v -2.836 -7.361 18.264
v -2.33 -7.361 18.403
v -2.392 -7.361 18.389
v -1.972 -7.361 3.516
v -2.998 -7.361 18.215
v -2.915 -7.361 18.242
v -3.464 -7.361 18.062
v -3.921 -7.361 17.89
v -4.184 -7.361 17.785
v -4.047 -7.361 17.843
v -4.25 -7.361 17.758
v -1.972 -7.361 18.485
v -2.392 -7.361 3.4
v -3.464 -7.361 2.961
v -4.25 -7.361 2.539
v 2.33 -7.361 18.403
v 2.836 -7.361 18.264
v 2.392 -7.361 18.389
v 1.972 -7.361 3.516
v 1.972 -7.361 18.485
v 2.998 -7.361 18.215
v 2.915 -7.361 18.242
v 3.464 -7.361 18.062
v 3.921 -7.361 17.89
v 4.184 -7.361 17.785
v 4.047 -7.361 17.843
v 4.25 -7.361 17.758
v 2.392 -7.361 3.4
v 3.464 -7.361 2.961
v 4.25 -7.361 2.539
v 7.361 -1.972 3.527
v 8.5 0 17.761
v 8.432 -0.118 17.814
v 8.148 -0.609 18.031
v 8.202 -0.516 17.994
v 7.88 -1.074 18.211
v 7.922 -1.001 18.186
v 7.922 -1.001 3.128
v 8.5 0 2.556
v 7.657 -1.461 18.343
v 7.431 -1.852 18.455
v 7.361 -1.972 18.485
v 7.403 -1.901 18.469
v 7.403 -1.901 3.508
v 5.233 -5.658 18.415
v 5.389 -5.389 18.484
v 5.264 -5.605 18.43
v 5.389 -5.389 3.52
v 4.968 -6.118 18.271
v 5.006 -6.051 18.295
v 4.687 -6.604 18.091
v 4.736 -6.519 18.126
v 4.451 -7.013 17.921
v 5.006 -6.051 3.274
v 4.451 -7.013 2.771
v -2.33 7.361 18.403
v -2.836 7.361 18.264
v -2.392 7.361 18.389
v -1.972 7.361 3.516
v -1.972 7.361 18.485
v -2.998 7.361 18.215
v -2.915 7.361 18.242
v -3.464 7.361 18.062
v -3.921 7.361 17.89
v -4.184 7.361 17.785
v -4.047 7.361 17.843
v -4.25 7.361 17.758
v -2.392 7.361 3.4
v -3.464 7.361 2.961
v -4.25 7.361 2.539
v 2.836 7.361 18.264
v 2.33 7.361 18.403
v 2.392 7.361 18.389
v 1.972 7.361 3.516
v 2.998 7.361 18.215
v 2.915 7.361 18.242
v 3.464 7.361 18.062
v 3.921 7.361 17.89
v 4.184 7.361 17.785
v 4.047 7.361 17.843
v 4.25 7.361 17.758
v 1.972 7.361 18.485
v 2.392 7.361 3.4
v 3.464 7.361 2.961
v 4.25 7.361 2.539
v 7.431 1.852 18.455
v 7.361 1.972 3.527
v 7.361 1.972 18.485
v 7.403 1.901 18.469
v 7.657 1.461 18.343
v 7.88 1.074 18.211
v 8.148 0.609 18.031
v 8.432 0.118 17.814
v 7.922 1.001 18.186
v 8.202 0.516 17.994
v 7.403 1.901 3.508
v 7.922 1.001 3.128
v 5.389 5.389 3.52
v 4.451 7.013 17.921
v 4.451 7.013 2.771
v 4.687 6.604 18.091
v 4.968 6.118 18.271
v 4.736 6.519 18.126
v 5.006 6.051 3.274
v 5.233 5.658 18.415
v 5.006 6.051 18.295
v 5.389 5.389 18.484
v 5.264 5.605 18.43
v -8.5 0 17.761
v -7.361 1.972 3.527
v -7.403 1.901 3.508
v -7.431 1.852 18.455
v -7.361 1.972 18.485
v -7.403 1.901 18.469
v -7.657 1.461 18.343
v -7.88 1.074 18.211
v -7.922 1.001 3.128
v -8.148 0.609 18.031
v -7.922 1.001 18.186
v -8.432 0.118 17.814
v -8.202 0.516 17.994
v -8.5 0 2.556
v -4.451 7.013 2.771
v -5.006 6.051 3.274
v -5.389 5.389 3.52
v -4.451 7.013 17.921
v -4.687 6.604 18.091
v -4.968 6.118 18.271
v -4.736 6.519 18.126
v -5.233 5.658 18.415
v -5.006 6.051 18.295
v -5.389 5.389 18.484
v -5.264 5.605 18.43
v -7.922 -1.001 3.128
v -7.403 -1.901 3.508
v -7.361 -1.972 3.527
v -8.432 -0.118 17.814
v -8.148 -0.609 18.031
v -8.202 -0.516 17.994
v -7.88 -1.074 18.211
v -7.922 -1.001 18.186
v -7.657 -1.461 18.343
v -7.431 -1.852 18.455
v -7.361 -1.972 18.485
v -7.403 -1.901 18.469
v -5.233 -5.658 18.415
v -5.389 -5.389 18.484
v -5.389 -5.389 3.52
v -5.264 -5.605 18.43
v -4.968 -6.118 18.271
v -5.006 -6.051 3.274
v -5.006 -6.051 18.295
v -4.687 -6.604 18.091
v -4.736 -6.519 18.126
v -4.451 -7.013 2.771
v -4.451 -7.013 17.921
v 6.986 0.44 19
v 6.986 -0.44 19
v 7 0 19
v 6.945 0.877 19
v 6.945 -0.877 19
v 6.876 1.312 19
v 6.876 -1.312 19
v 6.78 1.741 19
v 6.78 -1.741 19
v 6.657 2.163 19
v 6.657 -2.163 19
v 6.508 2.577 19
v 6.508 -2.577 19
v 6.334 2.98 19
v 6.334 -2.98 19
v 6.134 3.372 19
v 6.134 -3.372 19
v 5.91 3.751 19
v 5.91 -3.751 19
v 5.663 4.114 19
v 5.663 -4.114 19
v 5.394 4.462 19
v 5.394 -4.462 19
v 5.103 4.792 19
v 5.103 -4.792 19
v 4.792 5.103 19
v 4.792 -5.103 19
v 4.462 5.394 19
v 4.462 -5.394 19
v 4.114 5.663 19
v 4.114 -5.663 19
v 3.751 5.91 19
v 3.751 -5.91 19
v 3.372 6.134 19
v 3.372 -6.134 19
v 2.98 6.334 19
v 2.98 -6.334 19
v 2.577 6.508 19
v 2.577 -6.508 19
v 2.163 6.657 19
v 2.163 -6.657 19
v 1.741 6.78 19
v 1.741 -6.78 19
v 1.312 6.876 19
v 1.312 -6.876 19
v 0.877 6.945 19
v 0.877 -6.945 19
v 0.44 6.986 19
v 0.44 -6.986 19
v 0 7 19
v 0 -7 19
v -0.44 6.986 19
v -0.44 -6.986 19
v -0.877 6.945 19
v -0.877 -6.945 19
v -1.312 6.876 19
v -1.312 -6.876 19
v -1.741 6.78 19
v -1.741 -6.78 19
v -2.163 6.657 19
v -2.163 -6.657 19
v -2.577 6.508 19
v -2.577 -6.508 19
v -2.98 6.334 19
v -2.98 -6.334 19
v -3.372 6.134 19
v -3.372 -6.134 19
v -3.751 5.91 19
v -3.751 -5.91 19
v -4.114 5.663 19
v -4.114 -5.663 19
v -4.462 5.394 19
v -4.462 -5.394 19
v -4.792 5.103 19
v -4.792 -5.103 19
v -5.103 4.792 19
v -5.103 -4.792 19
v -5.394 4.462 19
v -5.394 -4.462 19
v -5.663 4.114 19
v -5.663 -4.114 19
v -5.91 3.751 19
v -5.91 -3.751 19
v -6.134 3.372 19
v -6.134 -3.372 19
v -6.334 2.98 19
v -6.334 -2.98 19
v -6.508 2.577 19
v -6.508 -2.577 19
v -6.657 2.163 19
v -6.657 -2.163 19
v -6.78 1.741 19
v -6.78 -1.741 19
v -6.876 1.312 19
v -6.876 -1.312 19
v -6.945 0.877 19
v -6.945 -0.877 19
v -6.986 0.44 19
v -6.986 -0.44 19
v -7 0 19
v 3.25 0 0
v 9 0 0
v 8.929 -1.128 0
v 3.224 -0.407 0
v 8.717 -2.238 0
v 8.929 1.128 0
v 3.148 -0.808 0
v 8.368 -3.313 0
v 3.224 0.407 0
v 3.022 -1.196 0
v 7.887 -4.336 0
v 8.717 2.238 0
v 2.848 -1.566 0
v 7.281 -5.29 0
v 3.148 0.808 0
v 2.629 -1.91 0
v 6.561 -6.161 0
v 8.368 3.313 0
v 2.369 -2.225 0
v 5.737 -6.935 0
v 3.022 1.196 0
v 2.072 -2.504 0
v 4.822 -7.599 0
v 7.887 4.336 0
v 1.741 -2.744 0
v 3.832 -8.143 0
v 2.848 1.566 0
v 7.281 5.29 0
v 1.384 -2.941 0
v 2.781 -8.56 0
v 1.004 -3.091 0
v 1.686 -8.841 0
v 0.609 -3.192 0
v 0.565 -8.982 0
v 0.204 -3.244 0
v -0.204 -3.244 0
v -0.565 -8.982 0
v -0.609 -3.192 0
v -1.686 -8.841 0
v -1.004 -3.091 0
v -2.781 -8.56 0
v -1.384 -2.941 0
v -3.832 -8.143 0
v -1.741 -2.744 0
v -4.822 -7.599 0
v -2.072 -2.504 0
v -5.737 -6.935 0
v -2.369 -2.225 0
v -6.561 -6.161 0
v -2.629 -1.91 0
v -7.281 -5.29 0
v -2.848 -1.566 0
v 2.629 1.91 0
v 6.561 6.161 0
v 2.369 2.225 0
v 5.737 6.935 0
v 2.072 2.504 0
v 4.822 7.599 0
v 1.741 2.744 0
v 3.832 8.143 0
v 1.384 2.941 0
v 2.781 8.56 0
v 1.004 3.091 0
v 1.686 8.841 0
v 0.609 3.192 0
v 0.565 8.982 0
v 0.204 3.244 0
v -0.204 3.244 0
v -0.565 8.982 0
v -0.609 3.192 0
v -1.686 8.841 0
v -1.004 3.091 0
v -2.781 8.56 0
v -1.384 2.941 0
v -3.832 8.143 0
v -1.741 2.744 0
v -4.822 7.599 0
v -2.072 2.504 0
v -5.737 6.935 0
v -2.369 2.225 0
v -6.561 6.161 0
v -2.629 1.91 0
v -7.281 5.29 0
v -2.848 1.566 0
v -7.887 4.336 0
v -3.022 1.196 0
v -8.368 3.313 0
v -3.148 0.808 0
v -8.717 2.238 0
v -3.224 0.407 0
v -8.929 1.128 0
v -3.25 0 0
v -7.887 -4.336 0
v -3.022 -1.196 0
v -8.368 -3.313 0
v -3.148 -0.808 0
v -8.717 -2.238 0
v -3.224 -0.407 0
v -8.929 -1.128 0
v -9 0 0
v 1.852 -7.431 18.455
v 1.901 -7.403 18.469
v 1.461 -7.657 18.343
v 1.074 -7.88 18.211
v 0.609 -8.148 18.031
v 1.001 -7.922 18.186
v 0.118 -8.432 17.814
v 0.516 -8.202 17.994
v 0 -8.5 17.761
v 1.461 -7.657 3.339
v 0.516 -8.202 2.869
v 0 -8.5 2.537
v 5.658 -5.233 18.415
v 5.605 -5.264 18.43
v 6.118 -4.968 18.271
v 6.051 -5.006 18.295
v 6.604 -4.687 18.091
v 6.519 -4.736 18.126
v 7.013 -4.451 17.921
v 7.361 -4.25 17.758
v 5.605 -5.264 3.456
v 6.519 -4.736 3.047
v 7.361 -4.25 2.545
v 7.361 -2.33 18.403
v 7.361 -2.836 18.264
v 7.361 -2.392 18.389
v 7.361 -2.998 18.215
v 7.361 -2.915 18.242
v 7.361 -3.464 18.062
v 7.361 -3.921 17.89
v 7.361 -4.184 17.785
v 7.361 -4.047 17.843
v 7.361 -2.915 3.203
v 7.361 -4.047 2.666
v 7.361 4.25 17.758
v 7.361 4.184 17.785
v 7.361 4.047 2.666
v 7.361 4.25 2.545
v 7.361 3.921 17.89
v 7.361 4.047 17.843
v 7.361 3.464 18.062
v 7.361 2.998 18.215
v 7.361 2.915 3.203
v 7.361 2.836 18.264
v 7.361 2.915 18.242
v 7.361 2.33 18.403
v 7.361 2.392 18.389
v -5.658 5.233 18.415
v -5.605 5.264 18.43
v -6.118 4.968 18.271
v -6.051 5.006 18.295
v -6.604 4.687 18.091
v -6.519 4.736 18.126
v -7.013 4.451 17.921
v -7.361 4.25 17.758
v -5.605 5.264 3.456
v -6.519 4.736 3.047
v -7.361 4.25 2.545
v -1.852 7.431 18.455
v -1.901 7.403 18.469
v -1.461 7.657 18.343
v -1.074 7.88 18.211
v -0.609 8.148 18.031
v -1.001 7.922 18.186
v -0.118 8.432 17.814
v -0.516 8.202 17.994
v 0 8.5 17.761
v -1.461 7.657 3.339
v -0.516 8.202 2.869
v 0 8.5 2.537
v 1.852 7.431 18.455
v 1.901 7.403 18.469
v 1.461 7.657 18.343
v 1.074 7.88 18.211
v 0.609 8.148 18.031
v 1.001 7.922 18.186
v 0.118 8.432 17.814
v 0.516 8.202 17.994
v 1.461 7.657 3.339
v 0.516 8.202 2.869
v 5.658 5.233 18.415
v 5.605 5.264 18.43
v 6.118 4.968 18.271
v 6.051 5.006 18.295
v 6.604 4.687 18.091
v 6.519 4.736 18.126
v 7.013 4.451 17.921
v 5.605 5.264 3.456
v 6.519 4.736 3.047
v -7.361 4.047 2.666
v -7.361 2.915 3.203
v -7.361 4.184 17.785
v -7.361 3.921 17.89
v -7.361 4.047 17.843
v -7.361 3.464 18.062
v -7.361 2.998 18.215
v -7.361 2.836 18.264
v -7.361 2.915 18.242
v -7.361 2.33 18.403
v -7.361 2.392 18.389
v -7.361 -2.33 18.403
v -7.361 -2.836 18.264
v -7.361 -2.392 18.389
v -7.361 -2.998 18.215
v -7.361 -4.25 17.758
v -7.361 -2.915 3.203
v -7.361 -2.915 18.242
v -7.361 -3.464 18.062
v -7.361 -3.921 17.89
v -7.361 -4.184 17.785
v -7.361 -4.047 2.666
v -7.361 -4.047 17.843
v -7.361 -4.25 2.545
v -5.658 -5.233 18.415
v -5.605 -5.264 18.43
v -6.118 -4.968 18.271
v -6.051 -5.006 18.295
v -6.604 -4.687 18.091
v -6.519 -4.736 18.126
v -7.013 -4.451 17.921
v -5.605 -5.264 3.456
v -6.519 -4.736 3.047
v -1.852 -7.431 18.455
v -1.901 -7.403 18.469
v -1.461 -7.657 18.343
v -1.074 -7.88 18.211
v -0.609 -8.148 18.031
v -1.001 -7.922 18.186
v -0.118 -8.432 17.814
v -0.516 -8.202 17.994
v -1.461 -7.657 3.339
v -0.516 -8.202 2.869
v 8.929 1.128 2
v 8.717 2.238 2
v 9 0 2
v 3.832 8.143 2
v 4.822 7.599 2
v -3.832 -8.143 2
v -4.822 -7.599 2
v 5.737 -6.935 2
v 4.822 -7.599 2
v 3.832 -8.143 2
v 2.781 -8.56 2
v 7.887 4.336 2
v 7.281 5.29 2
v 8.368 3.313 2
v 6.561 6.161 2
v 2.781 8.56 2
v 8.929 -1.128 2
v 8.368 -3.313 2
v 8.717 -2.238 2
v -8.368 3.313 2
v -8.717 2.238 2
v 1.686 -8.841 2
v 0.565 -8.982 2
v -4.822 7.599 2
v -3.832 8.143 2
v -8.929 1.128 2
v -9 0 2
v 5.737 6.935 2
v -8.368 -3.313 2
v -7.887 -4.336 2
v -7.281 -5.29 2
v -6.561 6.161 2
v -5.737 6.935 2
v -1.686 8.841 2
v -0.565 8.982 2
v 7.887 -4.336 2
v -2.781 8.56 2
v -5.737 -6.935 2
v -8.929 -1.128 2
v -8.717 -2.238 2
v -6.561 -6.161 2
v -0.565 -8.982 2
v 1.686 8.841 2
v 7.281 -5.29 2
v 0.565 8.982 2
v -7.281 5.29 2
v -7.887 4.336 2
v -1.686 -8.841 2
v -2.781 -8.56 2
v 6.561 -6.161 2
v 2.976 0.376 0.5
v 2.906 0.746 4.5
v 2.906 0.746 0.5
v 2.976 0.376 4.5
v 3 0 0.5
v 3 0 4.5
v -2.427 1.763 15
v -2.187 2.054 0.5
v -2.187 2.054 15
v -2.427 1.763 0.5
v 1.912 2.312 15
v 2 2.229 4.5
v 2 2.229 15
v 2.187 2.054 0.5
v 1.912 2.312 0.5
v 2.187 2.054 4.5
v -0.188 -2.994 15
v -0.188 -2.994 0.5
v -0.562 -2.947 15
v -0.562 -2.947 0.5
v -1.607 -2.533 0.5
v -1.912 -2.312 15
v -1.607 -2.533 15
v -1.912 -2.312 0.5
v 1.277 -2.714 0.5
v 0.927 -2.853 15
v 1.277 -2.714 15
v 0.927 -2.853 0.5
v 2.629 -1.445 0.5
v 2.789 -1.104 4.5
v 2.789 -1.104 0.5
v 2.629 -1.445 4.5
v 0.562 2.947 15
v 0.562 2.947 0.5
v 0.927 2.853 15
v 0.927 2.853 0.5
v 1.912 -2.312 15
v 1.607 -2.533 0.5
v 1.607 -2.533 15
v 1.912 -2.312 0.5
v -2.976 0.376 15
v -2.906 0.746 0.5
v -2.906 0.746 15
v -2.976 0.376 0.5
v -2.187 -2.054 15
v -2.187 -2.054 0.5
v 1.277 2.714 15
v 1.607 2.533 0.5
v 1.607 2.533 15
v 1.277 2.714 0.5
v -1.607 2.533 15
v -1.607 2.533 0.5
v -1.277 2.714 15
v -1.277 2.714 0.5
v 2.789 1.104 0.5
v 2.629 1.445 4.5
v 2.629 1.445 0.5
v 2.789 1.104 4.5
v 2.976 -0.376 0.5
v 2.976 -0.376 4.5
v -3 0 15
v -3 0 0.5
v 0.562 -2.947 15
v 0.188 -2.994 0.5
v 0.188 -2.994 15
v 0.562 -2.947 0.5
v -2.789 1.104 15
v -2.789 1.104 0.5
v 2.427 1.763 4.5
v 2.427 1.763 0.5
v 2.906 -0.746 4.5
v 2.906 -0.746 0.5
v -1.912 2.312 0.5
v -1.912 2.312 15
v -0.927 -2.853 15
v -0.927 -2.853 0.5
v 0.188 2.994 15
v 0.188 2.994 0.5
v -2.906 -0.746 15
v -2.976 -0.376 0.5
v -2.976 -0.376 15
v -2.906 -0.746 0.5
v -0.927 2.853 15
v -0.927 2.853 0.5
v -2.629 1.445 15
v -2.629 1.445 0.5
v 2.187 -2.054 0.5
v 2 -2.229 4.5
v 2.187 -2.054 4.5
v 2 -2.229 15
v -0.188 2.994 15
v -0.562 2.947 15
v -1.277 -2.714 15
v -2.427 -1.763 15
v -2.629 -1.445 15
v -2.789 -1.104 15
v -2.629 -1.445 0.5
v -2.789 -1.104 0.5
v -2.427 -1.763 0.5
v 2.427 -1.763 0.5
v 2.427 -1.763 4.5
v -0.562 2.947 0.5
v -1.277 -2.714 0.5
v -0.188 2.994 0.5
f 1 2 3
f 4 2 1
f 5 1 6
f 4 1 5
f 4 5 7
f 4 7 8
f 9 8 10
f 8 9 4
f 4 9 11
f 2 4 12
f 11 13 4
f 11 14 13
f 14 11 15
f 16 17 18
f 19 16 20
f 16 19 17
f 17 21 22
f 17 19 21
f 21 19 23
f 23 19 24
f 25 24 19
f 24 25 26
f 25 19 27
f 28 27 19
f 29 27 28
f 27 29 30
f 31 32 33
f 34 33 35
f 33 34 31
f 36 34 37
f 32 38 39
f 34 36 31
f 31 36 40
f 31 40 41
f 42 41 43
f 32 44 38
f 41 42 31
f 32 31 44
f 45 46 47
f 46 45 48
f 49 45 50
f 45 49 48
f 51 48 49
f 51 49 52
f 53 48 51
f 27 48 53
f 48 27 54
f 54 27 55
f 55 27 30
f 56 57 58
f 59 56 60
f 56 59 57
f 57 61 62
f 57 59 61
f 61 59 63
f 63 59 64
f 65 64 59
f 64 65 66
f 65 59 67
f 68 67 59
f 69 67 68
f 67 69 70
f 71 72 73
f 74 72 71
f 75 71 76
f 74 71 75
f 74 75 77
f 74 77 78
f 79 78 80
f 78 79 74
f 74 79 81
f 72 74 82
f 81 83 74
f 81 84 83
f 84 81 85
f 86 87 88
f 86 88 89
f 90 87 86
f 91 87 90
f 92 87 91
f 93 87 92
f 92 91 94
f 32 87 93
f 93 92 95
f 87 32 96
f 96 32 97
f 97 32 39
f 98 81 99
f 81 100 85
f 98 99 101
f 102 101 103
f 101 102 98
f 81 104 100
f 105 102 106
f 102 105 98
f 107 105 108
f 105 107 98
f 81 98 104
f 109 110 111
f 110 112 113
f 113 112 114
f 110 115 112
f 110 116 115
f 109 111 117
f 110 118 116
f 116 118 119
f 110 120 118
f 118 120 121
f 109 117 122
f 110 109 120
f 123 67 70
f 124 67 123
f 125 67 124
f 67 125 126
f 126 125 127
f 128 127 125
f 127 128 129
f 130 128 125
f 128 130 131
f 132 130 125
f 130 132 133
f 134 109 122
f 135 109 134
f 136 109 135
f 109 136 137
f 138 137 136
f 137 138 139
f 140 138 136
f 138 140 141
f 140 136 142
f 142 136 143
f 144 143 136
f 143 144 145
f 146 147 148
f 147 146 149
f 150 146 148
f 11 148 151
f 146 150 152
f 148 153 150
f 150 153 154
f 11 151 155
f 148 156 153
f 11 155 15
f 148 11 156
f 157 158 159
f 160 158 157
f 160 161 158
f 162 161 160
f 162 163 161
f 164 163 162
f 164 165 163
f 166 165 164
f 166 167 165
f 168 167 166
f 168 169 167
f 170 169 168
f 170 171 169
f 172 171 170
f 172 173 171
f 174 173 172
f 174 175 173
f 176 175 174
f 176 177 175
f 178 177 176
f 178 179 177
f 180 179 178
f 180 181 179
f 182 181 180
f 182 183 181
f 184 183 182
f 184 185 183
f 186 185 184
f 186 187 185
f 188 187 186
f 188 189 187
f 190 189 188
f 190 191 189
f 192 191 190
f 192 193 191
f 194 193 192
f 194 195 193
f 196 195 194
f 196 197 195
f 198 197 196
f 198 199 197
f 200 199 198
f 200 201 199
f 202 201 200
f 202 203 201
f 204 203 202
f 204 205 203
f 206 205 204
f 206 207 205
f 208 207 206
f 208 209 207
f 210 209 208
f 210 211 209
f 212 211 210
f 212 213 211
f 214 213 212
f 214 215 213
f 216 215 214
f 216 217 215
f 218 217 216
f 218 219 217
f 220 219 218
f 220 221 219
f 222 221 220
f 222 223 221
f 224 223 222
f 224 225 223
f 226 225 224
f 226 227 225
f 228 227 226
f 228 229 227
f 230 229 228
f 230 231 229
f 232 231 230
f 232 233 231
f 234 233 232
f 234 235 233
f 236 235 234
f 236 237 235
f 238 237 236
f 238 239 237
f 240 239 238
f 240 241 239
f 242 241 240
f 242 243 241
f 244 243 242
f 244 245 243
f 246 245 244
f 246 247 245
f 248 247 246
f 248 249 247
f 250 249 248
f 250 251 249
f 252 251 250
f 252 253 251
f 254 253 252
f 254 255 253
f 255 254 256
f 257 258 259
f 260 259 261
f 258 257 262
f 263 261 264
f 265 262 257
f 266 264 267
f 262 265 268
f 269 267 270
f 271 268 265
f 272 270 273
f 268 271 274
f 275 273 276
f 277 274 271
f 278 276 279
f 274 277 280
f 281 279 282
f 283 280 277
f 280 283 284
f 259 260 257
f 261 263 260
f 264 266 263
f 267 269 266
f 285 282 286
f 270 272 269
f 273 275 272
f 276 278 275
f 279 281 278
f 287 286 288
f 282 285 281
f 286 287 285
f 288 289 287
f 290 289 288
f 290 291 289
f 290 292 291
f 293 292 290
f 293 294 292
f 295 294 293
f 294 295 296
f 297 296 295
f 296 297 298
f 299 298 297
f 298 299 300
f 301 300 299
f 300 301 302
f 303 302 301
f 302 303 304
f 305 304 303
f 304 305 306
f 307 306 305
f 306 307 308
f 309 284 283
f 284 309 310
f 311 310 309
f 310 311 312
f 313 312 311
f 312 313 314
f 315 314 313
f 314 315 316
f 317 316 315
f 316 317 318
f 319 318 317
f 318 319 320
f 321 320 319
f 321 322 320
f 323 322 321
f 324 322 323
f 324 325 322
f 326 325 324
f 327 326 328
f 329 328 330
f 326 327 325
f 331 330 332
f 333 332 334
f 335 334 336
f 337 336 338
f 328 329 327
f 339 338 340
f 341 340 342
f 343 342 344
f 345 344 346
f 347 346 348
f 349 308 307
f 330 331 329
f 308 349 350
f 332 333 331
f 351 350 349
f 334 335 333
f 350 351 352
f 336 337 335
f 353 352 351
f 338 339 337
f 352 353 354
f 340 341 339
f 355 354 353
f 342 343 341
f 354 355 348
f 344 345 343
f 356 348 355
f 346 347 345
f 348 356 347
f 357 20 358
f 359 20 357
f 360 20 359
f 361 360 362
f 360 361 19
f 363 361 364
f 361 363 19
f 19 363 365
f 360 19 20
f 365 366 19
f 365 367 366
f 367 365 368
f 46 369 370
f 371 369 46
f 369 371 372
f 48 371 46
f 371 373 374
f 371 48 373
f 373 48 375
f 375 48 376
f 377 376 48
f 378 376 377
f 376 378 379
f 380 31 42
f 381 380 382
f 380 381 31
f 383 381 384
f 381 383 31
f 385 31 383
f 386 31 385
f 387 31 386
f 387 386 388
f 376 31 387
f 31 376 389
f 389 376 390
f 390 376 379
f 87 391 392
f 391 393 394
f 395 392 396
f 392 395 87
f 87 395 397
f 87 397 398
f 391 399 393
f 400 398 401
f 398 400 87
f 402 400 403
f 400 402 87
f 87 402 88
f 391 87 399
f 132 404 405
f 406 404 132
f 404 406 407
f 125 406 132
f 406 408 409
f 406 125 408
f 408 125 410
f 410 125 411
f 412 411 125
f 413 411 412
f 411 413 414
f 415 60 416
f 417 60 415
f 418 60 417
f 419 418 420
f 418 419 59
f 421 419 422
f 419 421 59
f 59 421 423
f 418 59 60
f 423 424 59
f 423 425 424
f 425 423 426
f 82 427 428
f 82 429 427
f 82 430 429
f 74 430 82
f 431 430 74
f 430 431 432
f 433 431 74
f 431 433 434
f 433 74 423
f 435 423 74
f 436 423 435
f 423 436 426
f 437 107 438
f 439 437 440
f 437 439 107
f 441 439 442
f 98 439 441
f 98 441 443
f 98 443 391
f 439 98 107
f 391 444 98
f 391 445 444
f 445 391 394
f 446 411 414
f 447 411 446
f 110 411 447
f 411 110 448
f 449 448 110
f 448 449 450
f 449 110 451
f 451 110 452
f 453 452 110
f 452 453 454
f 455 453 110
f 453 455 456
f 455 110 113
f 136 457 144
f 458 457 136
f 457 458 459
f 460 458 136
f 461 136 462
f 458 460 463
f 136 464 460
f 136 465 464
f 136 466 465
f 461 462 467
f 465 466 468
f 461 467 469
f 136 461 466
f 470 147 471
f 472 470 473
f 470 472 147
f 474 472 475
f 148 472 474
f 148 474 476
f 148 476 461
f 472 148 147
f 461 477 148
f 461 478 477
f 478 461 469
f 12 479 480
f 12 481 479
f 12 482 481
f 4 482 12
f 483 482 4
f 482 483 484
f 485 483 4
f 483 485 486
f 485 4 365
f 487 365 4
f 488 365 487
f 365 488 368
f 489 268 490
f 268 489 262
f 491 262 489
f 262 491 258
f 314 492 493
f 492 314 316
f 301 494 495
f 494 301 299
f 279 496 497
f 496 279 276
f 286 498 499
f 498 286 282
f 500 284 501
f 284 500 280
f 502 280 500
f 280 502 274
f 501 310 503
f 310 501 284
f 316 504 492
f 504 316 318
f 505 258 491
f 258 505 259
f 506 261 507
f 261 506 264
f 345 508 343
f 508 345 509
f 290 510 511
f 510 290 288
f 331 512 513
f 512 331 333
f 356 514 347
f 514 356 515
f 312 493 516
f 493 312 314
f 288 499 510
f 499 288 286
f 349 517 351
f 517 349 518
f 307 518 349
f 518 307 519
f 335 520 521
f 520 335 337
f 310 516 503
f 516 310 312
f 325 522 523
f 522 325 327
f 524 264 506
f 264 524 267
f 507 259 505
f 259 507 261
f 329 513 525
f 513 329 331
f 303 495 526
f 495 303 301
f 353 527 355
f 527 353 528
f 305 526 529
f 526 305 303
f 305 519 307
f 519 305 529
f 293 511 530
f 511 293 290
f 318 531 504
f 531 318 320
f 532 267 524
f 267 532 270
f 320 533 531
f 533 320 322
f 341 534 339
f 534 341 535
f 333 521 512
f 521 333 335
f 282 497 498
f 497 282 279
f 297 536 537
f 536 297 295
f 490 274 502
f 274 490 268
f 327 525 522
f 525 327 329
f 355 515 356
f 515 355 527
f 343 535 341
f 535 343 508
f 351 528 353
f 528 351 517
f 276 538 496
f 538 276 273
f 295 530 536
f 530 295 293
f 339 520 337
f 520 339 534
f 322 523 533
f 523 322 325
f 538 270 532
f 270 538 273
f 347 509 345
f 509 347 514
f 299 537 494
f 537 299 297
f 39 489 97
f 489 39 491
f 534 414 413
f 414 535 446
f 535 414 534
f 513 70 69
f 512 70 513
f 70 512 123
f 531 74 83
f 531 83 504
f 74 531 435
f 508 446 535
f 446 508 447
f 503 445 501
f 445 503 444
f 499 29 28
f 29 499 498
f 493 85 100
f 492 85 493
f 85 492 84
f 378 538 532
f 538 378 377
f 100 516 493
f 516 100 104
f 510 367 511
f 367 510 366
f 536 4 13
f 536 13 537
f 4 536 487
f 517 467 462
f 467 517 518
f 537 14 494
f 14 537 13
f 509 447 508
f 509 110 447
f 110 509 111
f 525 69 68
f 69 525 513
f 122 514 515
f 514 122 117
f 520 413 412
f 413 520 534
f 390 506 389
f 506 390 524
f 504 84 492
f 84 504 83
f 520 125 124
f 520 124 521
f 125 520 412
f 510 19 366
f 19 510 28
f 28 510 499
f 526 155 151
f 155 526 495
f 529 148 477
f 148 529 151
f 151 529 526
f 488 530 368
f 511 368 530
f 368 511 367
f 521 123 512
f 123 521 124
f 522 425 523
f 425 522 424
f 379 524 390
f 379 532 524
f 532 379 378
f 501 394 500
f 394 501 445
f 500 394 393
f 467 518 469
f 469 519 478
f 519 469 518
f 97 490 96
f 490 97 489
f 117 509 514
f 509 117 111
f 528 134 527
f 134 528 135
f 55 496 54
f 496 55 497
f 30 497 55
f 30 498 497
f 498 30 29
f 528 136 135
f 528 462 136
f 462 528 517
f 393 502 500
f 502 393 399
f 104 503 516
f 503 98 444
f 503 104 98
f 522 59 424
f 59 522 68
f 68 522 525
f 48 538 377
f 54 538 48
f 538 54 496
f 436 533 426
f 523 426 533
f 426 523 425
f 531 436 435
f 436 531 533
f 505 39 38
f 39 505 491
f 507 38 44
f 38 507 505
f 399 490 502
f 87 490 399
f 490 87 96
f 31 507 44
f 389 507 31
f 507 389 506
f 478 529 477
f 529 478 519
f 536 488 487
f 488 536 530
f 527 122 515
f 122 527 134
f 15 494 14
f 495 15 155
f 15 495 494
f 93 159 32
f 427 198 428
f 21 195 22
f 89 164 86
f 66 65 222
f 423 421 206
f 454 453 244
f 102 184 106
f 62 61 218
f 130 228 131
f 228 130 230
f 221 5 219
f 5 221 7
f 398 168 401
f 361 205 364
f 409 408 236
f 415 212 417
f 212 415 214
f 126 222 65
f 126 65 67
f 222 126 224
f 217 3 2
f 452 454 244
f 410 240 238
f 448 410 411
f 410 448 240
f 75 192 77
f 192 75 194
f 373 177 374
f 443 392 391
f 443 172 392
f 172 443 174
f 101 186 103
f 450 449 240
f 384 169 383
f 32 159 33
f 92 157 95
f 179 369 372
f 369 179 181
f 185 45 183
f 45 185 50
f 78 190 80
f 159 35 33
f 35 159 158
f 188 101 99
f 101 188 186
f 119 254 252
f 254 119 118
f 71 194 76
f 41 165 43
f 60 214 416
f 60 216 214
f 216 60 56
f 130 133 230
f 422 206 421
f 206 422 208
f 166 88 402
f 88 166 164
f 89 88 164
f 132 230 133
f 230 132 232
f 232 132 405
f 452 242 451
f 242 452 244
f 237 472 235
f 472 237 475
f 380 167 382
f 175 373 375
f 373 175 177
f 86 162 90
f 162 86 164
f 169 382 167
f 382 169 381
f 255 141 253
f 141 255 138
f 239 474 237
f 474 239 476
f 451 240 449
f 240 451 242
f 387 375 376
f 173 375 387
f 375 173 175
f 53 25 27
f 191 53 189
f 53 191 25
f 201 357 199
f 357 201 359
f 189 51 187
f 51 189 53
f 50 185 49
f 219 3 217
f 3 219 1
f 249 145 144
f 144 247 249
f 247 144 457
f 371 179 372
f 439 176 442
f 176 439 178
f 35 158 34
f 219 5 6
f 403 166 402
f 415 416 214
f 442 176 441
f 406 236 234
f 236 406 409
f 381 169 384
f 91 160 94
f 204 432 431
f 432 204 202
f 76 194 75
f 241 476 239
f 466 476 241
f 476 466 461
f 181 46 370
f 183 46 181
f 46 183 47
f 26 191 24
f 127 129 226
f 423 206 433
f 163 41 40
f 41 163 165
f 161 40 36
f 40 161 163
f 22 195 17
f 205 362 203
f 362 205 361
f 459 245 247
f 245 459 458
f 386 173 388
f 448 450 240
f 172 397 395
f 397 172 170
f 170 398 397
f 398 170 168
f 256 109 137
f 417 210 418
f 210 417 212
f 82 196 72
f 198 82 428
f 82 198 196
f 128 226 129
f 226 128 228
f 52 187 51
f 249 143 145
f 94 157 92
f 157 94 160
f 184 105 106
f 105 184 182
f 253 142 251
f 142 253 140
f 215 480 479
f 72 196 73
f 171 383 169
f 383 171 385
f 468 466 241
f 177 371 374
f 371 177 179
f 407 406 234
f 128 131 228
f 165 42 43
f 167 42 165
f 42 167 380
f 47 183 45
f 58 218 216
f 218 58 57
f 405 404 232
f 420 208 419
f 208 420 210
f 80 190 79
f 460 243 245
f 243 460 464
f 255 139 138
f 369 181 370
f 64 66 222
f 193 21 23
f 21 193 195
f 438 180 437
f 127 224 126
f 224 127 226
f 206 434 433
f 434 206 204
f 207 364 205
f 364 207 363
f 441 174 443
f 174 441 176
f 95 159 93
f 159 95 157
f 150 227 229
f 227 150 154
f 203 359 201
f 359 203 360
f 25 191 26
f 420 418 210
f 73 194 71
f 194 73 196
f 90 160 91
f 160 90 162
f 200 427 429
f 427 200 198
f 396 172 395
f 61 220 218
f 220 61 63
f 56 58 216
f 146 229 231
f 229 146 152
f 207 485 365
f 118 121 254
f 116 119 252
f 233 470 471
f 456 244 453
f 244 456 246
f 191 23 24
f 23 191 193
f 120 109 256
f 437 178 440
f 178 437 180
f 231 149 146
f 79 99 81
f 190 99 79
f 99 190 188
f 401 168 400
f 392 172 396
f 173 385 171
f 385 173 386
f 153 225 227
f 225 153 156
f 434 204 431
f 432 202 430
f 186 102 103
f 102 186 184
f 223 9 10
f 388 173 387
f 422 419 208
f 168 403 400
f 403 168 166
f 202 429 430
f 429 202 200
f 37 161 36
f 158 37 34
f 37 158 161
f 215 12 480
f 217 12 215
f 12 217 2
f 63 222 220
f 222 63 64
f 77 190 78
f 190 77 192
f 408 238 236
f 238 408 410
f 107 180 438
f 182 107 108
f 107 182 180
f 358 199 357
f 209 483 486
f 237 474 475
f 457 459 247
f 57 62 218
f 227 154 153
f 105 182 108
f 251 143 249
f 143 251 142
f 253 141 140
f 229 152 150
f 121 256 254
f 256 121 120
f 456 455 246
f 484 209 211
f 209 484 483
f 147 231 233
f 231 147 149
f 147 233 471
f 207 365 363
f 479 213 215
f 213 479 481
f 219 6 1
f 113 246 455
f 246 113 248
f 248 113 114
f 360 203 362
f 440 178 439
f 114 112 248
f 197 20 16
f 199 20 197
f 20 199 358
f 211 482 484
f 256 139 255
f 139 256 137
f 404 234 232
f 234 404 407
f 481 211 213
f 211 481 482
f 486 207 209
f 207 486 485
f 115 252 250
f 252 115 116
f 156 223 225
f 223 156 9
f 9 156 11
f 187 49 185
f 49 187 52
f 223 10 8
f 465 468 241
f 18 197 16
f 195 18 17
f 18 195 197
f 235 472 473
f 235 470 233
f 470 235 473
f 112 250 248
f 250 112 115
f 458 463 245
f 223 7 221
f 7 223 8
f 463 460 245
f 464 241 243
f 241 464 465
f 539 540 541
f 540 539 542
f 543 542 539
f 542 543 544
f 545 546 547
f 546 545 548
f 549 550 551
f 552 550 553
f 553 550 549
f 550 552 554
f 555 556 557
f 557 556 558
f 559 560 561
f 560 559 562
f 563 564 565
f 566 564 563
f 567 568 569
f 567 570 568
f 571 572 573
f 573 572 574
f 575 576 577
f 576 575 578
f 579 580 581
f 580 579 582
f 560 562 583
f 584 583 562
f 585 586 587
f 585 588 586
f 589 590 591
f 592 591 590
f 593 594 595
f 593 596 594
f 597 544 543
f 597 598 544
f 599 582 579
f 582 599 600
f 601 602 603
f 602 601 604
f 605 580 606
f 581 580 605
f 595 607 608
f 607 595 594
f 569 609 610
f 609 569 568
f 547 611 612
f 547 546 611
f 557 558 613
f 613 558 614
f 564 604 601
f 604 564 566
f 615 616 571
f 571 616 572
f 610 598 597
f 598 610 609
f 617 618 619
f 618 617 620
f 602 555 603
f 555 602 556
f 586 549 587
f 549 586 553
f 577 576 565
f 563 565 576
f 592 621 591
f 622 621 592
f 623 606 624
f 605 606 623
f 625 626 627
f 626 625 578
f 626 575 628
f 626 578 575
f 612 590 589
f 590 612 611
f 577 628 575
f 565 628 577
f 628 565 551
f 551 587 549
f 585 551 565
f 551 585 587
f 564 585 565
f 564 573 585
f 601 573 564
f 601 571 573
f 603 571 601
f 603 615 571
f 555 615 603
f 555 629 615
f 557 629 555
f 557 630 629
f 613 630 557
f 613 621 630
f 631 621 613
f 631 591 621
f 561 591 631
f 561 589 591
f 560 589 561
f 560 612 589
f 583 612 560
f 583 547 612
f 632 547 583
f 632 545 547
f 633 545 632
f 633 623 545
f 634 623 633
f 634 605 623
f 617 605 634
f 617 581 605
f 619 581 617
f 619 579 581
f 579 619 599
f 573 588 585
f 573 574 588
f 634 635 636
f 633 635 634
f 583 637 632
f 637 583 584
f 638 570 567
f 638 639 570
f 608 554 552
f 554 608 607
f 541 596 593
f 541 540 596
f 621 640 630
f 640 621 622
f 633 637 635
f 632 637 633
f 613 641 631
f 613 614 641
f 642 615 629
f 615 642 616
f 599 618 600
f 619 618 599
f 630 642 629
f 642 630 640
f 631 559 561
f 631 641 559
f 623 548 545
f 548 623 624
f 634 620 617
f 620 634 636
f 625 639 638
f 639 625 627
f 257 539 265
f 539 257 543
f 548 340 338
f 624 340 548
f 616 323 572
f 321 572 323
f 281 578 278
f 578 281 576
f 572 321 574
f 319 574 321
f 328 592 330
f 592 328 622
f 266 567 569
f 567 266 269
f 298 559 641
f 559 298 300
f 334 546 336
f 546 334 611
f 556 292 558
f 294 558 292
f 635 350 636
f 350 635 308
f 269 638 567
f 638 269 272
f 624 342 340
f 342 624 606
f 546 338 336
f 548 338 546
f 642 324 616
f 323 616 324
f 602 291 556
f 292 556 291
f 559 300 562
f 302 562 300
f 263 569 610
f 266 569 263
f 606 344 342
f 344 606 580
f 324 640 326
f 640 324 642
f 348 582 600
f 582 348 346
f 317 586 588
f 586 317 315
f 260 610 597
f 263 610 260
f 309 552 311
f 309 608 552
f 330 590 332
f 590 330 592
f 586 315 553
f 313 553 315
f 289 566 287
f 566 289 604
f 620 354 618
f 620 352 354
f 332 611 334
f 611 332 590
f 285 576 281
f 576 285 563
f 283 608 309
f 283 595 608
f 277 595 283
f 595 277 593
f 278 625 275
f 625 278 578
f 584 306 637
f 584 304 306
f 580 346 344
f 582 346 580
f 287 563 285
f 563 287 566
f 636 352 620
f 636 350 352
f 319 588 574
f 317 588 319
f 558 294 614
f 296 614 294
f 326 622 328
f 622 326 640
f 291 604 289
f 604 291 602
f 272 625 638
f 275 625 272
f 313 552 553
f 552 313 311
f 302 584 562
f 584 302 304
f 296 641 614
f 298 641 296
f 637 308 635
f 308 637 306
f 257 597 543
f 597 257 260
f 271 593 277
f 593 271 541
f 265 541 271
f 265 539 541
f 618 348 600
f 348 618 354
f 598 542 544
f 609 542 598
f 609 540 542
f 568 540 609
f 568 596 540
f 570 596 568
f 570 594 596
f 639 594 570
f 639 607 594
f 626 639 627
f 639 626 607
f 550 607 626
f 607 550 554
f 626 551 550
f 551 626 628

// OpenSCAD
shaft_height = 15;
shaft_depth = 11;

width=17;
diameter_bottom_finish = 1;

extra_height = 0;
toprounding=-3;

shaft_clear = shaft_height-shaft_depth;
n = 6+0;
min_cap = 4+0;
height = shaft_height + min_cap + extra_height;
diameterBottom = width + diameter_bottom_finish;

$fn = 100;

difference(){
	intersection(){
		union(){
			cylinder(d=width,h=height,$fn=n);
			rotate(a=360/n/2,v=[0,0,1]) cylinder(d=width,h=height,$fn=n);
			// bottom finish
            cylinder(d=diameterBottom,h=2,$fn=50);
			translate([0,0,2]) cylinder(d1=diameterBottom,d2=0,h=10,$fn=50);
		};
		// top finish
        cylinder(d1=60,d2=width+toprounding,h=height);
	};
    // Shaft
	difference(){
		union(){
			cylinder(d=6,h=shaft_height,$fn=50);
			cylinder(d1=6.5,d2=0,h=6.5,$fn=50);
		}
        translate([0,0, shaft_clear])
		translate([7,0,6]) cube([10,10,shaft_height-shaft_clear],center=true);
	}
}
